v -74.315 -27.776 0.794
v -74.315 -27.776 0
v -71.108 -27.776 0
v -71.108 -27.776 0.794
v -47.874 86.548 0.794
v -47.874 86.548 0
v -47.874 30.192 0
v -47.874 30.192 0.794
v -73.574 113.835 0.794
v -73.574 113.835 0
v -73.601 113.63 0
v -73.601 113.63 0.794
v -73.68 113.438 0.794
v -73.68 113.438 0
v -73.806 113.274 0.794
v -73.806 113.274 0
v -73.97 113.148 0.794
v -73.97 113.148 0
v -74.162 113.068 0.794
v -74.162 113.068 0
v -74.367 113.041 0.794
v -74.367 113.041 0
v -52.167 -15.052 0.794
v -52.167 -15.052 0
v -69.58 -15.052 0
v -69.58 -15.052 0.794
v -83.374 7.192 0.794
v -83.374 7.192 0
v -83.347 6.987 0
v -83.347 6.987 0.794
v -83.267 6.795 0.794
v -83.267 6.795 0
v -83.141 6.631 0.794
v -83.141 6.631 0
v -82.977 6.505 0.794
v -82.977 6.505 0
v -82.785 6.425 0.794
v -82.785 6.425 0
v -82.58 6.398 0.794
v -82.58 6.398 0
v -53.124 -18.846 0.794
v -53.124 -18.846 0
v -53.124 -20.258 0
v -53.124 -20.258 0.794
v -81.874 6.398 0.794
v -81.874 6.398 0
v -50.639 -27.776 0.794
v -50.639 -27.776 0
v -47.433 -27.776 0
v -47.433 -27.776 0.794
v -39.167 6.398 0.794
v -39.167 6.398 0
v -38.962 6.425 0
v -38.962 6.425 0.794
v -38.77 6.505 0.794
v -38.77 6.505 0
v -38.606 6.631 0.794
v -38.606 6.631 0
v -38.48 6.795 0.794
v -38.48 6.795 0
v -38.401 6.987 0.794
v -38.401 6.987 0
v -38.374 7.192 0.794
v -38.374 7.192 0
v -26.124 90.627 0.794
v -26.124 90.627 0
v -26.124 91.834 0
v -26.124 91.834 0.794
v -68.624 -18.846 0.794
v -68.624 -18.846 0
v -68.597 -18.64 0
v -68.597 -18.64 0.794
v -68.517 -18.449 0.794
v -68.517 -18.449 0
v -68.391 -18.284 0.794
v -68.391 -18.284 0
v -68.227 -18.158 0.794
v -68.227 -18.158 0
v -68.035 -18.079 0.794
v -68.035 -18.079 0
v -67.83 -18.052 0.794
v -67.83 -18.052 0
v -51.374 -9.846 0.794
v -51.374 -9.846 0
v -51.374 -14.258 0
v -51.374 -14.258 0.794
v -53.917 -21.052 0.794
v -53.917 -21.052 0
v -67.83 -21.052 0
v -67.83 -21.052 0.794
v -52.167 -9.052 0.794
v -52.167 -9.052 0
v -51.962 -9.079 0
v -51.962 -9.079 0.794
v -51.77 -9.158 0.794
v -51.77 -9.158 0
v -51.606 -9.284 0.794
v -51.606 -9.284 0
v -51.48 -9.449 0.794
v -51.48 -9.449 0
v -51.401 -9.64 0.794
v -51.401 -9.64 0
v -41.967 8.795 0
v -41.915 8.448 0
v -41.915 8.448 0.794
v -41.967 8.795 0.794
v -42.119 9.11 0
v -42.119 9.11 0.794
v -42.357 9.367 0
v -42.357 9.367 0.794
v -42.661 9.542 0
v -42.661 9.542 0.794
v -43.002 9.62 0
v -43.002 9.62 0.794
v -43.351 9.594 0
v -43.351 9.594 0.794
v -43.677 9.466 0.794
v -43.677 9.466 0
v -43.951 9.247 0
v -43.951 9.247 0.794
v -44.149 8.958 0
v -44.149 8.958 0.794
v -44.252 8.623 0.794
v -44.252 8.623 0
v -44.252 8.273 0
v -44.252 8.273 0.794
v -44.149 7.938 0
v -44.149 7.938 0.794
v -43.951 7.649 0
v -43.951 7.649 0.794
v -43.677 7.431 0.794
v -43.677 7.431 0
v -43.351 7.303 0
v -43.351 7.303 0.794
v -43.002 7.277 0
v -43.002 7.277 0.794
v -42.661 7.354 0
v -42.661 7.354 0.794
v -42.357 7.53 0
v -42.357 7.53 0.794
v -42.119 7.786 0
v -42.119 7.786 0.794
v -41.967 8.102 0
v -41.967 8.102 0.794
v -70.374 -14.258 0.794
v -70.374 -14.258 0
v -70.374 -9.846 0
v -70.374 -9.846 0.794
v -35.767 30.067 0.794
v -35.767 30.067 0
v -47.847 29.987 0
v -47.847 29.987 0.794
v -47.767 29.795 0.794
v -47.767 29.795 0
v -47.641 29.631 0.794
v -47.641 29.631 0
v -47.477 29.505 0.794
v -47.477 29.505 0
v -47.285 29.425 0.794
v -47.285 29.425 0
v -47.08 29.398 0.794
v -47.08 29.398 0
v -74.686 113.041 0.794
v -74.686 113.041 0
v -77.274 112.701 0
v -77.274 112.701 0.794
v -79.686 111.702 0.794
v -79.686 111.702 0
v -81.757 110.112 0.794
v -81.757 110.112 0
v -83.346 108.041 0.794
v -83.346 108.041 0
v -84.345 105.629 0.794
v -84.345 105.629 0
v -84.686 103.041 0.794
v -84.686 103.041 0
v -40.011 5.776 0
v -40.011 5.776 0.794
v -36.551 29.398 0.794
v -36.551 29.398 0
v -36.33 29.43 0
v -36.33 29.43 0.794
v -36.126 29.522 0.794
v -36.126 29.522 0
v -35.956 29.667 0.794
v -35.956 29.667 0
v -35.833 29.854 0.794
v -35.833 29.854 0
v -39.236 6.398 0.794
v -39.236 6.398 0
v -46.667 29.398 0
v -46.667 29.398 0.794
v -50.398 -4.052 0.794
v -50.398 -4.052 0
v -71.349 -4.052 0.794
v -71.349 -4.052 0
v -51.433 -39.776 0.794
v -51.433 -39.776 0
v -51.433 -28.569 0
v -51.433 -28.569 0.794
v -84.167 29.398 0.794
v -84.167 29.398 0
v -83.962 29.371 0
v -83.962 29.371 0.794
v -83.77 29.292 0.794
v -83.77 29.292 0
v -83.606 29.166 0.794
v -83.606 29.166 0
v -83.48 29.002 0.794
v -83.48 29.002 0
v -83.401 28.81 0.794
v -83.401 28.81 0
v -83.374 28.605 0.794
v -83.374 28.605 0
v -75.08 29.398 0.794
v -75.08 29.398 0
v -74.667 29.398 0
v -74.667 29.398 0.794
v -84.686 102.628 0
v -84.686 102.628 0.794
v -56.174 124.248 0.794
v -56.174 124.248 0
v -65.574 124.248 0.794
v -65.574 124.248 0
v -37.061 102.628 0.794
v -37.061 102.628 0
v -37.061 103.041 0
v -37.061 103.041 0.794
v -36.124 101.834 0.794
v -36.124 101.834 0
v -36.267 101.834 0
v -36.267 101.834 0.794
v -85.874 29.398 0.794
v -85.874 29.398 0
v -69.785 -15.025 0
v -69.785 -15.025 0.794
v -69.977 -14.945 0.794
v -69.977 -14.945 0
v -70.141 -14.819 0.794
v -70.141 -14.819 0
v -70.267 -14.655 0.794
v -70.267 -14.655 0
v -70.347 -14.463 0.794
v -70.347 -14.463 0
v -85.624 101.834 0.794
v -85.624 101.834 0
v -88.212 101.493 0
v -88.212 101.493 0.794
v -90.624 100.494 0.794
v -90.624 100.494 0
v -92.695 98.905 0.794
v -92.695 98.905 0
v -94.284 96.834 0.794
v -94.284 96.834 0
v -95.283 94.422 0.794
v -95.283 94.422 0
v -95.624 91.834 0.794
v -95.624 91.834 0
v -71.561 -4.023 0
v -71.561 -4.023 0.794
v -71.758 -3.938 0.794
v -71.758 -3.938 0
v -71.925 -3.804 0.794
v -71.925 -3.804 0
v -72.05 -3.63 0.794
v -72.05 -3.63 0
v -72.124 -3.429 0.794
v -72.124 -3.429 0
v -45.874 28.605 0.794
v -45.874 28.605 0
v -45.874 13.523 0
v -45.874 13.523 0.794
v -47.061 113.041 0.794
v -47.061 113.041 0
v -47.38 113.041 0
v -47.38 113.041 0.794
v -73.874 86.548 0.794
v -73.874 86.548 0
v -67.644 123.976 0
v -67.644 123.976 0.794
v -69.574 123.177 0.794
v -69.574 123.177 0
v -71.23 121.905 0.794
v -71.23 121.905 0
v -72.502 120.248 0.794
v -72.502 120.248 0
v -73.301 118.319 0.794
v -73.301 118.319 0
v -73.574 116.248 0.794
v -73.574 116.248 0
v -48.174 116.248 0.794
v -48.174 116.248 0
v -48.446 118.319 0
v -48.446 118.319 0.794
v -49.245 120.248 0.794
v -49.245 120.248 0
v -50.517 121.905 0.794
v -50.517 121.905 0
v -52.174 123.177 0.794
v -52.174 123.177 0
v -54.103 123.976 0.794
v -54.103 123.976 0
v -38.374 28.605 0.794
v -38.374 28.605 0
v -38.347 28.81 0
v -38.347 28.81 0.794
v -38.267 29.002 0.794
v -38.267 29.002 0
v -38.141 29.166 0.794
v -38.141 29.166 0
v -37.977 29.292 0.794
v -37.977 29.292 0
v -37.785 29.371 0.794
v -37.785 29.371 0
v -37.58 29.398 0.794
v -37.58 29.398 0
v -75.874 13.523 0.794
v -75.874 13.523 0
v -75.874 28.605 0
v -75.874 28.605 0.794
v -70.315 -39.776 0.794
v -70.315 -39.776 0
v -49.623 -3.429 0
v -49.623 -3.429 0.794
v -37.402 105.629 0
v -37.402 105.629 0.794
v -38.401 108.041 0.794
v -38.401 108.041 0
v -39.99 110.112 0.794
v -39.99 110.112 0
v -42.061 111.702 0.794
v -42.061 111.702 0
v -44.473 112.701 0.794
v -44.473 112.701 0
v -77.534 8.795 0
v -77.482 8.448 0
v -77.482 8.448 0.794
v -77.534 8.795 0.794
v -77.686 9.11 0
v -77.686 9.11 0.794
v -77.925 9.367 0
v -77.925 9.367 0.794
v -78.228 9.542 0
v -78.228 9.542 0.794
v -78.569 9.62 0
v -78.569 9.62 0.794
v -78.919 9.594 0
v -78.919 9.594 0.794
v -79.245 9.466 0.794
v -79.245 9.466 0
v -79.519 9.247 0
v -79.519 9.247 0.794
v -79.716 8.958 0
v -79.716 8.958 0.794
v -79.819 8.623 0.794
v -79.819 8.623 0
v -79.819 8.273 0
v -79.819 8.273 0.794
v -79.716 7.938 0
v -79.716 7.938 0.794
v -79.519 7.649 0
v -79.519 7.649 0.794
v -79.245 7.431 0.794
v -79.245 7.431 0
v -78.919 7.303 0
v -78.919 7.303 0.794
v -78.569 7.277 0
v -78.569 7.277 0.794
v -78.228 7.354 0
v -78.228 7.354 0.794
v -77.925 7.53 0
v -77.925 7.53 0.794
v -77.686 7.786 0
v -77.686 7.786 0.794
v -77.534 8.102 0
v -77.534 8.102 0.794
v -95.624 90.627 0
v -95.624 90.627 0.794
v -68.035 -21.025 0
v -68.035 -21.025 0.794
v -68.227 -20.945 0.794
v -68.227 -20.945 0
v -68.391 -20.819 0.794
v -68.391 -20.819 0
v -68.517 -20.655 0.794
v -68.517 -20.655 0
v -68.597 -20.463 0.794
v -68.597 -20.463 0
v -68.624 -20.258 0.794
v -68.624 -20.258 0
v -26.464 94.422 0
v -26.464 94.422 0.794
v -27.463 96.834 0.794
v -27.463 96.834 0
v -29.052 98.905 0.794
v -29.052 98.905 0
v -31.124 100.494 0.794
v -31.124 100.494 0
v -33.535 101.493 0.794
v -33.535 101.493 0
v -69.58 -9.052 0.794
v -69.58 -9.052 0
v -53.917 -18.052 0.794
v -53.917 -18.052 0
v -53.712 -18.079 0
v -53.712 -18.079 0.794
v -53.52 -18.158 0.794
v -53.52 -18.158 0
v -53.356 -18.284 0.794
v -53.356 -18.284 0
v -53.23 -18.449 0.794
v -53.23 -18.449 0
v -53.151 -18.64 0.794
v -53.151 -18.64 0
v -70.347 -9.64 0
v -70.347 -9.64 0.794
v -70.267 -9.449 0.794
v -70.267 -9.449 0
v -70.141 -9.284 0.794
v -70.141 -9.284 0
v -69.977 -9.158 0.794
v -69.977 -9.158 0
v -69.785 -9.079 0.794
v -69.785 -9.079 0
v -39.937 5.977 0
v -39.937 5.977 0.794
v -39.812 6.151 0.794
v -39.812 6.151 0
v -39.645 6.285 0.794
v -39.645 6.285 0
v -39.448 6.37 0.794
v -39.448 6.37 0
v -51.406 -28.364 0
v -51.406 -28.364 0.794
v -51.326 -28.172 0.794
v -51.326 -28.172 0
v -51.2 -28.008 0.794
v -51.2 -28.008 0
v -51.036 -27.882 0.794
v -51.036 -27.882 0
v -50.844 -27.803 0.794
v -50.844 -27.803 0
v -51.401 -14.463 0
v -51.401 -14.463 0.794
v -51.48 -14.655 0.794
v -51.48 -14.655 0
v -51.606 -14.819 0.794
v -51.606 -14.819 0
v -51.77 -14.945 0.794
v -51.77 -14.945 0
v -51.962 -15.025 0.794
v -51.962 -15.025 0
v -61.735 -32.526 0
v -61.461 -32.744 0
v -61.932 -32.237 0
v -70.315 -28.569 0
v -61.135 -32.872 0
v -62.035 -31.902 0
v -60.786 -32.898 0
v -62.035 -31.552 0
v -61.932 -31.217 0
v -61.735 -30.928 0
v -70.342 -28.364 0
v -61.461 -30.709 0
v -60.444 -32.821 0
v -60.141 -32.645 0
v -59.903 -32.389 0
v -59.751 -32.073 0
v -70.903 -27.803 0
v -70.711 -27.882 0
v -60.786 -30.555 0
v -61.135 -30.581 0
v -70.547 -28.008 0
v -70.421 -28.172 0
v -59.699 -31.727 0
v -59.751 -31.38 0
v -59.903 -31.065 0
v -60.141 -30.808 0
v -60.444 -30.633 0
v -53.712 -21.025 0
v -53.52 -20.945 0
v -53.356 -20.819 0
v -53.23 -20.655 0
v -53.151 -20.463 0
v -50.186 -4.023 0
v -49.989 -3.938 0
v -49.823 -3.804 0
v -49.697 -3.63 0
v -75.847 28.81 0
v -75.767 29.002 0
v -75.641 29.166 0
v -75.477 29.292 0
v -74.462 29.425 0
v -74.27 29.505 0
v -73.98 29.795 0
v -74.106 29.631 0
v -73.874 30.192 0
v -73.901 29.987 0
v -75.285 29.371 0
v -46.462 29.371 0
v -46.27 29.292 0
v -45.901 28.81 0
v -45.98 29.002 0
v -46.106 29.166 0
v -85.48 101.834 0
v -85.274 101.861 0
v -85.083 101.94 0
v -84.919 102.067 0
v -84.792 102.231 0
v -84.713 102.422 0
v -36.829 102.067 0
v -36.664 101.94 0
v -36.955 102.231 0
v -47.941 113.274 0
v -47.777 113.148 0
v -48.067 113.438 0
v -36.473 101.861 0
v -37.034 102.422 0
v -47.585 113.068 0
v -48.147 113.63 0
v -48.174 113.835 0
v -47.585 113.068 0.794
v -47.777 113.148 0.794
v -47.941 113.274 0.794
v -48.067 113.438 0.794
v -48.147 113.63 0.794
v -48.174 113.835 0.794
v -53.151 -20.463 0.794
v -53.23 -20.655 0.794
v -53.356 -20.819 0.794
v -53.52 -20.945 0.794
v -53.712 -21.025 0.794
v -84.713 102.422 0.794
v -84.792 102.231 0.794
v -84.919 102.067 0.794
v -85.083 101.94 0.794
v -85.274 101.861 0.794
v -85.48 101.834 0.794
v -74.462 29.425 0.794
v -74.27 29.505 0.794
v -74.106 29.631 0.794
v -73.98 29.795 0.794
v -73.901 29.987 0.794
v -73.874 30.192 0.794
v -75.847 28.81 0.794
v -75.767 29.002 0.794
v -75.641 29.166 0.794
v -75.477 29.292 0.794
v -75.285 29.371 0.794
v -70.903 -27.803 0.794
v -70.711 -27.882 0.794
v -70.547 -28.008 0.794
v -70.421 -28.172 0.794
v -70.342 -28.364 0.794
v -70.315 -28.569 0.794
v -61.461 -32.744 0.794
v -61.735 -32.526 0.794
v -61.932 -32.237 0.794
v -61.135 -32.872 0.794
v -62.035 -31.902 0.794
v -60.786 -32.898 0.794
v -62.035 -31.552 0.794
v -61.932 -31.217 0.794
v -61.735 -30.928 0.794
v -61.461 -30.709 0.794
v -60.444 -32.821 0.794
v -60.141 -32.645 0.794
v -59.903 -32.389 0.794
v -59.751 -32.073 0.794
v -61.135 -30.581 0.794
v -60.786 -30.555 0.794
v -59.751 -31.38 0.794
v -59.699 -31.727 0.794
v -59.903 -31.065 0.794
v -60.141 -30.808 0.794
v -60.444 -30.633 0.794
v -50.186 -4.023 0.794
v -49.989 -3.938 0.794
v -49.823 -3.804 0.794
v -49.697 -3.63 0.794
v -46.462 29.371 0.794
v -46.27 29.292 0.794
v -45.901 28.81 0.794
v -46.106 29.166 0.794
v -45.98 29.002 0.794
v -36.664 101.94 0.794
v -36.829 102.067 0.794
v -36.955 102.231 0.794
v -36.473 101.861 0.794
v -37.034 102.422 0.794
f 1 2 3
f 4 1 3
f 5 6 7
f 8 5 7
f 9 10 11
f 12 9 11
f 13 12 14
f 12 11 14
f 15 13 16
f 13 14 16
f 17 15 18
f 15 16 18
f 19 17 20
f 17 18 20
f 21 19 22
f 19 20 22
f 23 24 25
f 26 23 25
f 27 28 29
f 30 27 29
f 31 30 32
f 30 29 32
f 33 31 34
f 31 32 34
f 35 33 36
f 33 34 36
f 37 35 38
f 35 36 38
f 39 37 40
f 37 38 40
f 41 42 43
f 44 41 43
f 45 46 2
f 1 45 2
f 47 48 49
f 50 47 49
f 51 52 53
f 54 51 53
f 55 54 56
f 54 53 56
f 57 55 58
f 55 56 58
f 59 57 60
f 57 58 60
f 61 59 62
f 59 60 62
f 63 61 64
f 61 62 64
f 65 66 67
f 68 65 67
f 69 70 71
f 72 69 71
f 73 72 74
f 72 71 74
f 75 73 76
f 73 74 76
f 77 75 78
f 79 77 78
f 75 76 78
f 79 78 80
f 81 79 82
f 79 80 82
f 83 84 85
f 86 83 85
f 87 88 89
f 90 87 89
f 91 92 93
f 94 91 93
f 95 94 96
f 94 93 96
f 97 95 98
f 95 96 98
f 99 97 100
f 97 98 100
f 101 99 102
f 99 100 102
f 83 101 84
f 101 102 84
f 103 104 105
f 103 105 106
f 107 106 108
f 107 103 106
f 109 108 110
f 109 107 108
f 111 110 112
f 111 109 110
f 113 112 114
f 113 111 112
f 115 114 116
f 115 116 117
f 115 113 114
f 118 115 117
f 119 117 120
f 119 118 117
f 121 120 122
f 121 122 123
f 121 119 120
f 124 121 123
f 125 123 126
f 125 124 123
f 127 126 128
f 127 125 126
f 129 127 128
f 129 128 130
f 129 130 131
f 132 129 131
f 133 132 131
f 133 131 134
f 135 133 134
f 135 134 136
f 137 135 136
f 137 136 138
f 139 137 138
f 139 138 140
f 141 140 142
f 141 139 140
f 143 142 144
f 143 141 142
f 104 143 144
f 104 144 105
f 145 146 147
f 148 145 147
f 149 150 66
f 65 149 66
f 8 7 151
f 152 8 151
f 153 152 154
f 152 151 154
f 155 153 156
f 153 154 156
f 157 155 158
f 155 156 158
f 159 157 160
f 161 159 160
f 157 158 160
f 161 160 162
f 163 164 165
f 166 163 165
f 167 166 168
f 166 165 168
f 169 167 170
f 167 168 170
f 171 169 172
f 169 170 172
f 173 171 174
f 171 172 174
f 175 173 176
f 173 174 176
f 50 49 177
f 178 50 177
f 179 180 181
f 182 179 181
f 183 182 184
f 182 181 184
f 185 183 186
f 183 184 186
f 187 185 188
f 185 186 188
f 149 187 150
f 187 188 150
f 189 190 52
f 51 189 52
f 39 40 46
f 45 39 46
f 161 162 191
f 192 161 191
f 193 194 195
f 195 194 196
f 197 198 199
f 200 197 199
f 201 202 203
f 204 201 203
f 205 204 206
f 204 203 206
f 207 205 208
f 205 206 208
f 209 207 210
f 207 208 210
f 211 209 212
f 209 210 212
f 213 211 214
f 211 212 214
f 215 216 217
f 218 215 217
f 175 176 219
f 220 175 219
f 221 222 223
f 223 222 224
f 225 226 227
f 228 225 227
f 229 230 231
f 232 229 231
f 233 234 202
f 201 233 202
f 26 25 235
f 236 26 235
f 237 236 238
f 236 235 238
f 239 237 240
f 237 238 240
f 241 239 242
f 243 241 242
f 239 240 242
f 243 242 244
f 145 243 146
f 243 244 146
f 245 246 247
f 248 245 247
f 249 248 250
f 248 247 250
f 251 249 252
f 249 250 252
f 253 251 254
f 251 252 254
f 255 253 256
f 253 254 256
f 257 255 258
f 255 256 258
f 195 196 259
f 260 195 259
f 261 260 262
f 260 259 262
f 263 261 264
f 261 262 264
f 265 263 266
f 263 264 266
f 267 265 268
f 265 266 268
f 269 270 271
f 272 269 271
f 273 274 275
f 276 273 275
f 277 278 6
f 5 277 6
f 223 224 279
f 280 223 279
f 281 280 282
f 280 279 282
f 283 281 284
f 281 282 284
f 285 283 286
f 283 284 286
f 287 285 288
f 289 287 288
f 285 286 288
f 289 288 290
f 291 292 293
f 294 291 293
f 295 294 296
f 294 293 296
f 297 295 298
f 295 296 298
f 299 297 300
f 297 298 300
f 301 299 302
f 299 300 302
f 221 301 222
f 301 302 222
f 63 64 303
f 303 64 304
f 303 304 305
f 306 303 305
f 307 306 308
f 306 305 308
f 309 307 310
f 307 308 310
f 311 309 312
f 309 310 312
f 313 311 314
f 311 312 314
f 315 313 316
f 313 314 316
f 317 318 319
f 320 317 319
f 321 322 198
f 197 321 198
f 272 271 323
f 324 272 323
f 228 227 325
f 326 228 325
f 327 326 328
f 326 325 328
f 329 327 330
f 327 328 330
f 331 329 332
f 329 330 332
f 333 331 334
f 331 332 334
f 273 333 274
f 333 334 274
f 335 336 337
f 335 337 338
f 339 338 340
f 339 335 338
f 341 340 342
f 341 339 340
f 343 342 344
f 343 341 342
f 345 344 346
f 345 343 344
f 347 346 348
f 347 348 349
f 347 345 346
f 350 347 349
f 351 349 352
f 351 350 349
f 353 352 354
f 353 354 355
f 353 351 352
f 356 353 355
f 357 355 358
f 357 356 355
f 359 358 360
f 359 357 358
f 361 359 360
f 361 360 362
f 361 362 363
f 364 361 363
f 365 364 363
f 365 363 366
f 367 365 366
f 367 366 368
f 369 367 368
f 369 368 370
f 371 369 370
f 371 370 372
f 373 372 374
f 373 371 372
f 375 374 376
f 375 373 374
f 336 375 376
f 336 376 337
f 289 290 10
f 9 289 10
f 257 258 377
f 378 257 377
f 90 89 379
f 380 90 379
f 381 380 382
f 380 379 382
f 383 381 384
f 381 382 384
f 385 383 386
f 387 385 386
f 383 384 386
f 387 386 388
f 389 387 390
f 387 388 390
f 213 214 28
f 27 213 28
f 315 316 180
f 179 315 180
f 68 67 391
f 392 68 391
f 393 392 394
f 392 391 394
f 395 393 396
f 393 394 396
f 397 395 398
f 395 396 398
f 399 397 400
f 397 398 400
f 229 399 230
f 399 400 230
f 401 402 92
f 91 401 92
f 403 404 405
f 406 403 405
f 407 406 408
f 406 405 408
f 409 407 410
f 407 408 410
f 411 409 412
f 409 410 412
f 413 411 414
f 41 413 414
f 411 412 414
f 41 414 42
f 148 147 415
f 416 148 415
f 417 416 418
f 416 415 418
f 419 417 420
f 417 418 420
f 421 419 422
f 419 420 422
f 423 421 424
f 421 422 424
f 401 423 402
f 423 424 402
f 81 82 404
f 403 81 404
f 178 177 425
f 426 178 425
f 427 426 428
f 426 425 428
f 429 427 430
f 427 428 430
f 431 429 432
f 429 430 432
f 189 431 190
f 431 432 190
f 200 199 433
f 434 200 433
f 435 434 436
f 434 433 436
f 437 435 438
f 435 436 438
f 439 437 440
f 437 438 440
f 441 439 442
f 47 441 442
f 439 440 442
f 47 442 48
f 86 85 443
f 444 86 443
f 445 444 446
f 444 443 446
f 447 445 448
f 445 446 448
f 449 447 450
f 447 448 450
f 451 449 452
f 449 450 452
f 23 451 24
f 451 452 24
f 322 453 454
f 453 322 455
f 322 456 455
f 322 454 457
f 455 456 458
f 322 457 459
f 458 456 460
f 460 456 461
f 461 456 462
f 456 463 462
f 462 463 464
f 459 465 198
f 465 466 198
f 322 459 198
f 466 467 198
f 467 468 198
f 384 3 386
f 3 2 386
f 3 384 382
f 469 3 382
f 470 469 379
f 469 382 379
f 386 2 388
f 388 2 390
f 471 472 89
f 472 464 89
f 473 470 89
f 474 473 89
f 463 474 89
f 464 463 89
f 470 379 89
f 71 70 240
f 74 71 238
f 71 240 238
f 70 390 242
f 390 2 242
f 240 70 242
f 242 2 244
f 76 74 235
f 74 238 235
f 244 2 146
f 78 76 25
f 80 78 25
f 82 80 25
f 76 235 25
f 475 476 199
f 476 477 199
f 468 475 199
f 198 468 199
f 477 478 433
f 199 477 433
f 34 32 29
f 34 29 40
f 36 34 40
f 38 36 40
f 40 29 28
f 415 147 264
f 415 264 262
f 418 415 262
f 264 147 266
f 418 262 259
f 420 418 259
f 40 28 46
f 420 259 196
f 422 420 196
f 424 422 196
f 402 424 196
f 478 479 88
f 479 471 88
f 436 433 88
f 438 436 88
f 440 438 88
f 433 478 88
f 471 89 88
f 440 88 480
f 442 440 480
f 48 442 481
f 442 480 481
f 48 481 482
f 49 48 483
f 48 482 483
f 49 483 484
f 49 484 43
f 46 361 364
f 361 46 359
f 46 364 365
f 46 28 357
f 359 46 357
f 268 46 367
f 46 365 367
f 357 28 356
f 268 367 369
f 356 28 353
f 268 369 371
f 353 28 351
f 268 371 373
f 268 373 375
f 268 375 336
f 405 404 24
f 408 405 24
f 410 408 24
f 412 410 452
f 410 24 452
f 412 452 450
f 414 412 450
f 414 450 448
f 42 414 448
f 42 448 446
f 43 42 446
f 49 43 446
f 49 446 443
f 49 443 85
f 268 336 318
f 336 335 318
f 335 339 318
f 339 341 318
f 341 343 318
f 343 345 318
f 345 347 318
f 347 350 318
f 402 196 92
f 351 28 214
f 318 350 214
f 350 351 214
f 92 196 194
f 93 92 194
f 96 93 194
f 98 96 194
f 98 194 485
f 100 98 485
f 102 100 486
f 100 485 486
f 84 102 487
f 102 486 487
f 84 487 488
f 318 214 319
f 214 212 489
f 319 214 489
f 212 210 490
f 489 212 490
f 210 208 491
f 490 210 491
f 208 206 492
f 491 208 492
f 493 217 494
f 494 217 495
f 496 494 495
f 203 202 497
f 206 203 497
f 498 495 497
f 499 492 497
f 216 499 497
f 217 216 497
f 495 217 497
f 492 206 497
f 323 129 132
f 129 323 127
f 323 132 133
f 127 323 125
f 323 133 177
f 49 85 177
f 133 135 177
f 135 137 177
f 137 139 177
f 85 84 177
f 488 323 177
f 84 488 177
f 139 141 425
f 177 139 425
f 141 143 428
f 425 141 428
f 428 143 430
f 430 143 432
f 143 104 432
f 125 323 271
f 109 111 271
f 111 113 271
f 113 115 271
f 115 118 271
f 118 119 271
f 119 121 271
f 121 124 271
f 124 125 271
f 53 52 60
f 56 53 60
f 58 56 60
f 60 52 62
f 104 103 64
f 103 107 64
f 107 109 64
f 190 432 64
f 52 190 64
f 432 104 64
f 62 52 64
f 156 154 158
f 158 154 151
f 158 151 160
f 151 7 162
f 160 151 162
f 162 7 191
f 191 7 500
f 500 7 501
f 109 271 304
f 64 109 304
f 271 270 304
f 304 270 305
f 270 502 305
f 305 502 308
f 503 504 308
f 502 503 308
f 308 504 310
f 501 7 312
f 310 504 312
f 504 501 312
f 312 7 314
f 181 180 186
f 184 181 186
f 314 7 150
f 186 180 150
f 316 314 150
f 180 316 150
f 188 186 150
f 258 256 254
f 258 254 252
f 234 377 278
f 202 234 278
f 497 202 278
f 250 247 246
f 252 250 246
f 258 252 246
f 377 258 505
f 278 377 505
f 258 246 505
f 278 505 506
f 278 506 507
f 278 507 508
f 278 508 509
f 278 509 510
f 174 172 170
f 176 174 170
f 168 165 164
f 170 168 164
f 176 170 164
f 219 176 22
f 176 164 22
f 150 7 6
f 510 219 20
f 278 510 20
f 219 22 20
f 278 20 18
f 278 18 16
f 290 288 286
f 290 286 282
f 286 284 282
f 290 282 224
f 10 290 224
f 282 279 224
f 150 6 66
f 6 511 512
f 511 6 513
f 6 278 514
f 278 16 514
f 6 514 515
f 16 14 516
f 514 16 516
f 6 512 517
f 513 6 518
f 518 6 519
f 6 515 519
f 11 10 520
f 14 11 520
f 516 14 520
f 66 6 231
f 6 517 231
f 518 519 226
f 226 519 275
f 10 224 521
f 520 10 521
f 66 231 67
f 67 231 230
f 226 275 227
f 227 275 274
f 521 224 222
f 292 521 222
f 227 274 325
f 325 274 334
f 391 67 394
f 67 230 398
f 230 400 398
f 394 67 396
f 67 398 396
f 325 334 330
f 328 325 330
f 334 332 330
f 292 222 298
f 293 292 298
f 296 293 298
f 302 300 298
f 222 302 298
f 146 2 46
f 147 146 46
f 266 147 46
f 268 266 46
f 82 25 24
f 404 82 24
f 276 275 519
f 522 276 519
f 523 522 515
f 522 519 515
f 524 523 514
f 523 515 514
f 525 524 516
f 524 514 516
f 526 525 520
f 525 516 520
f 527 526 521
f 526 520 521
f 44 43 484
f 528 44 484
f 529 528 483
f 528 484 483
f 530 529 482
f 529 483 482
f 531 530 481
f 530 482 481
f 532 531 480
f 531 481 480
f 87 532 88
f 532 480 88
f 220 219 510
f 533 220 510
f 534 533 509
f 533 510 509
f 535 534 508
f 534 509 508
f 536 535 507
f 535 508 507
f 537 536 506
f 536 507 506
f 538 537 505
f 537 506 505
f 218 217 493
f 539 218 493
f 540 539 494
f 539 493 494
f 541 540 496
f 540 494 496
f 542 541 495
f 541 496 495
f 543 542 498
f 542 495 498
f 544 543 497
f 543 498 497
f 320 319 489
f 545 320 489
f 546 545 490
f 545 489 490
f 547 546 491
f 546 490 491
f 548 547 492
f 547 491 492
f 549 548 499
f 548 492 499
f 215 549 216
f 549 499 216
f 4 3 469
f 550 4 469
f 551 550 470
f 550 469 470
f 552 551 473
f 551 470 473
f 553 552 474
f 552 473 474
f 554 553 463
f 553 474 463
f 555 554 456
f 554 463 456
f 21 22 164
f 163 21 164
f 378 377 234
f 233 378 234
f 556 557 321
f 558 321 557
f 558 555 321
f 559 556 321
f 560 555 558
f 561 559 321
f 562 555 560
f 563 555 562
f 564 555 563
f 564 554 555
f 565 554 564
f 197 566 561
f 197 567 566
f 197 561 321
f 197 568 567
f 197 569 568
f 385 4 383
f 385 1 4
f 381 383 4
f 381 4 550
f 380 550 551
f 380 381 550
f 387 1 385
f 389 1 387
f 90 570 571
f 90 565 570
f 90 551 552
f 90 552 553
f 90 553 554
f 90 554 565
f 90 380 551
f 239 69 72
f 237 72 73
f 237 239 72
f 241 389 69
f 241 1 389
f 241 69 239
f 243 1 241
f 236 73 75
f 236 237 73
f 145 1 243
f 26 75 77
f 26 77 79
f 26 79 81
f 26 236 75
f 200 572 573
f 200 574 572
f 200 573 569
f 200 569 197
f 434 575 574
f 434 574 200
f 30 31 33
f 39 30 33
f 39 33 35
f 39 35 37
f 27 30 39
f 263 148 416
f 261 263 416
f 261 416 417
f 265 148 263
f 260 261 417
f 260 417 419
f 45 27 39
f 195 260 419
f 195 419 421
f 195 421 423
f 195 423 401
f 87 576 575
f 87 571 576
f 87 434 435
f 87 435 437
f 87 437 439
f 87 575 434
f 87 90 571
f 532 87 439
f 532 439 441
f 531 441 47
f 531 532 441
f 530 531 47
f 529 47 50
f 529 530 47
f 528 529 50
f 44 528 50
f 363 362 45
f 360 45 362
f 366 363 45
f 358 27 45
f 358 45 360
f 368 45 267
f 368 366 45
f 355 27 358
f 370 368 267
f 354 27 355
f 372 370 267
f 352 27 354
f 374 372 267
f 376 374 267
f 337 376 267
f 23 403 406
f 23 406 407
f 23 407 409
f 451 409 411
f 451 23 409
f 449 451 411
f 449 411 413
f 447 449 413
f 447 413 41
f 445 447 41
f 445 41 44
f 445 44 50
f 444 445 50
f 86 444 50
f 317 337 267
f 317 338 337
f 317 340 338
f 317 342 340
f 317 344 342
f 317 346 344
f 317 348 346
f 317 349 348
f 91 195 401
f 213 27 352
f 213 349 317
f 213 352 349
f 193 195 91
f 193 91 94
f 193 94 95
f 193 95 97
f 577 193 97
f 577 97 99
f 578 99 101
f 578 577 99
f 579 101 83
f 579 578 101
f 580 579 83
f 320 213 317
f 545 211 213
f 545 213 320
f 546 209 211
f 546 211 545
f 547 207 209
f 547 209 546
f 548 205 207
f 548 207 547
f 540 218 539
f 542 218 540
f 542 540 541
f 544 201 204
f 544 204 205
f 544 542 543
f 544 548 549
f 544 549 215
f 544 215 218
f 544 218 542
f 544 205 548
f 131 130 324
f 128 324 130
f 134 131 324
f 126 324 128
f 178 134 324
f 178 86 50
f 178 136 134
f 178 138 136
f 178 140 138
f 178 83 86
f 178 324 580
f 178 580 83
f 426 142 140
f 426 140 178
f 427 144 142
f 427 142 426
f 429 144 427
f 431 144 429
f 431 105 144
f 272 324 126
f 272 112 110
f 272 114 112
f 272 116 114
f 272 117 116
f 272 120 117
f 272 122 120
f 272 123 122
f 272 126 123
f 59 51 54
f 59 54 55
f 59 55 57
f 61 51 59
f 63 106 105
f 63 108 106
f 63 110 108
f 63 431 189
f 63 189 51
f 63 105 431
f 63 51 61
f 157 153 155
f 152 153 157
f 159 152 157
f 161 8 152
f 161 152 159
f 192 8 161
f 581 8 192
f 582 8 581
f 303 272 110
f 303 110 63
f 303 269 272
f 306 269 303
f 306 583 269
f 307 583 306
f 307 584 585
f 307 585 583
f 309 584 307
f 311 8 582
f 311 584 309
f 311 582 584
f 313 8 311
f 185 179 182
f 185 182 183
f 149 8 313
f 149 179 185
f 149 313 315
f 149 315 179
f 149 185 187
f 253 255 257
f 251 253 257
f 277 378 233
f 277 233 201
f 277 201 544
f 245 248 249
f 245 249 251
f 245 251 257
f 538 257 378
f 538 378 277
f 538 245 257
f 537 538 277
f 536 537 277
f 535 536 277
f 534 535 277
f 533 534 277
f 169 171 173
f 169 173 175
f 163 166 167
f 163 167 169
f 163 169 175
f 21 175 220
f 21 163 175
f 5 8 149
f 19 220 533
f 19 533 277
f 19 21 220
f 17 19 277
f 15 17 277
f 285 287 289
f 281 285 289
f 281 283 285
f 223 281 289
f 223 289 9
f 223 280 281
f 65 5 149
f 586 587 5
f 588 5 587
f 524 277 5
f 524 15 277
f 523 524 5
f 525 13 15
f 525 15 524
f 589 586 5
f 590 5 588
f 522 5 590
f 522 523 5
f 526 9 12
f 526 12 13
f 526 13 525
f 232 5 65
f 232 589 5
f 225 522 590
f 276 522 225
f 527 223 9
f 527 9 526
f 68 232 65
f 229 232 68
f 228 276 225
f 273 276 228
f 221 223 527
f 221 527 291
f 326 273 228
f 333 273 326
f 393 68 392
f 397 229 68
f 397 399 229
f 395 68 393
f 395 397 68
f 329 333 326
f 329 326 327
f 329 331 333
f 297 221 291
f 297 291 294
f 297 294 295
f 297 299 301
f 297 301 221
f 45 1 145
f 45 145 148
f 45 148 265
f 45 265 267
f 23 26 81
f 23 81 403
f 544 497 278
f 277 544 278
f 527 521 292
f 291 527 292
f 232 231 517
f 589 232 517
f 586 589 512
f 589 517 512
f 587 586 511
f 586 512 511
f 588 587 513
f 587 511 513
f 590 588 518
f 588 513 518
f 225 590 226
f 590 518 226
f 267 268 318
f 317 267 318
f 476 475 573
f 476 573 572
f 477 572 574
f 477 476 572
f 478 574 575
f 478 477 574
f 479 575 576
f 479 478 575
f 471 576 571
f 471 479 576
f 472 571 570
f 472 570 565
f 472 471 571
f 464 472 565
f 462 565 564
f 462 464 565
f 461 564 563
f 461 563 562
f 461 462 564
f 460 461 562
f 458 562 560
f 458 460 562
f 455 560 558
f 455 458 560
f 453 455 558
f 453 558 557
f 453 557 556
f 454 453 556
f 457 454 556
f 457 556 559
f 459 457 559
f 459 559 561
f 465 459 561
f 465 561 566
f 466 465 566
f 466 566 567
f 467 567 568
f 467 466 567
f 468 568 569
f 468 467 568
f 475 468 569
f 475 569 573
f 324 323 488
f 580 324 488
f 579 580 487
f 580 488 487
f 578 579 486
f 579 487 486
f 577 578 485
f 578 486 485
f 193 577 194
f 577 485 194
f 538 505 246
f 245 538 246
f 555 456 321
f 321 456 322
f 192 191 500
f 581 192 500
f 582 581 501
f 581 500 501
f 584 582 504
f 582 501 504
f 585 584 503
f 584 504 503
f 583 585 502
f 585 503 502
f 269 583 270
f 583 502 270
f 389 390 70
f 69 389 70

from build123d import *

# Parameters (mm, degrees)
F0_R     = 1.175
F1_DEPTH = 0.79375


with BuildPart() as f1:
    # F0 (on Top) → F1 (new body)
    with BuildSketch(Plane.XY):
        with BuildLine():
            Line((-95.623562, 91.834139), (-95.623562, 90.626995))
            Line((-95.623562, 90.626995), (-85.873562, 29.398428))
            Line((-85.873562, 29.398428), (-84.167312, 29.398428))
            ThreePointArc((-84.167312, 29.398428), (-83.606046, 29.165944), (-83.373562, 28.604678))
            Line((-83.373562, 28.604678), (-83.373562, 7.192178))
            ThreePointArc((-83.373562, 7.192178), (-83.141078, 6.630911), (-82.579812, 6.398428))
            Line((-82.579812, 6.398428), (-81.873562, 6.398428))
            Line((-81.873562, 6.398428), (-74.314535, -27.775555))
            Line((-74.314535, -27.775555), (-71.108285, -27.775555))
            ThreePointArc((-71.108285, -27.775555), (-70.547019, -28.008039), (-70.314535, -28.569305))
            Line((-70.314535, -28.569305), (-70.314535, -39.775555))
            Line((-70.314535, -39.775555), (-51.43259, -39.775555))
            Line((-51.43259, -39.775555), (-51.43259, -28.569305))
            ThreePointArc((-51.43259, -28.569305), (-51.200106, -28.008039), (-50.63884, -27.775555))
            Line((-50.63884, -27.775555), (-47.43259, -27.775555))
            Line((-47.43259, -27.775555), (-40.011215, 5.776105))
            ThreePointArc((-40.011215, 5.776105), (-39.733173, 6.223592), (-39.236198, 6.398428))
            Line((-39.236198, 6.398428), (-39.167312, 6.398428))
            ThreePointArc((-39.167312, 6.398428), (-38.606046, 6.630911), (-38.373562, 7.192178))
            Line((-38.373562, 7.192178), (-38.373562, 28.604678))
            ThreePointArc((-38.373562, 28.604678), (-38.141078, 29.165944), (-37.579812, 29.398428))
            Line((-37.579812, 29.398428), (-36.550917, 29.398428))
            ThreePointArc((-36.550917, 29.398428), (-36.035669, 29.58839), (-35.767043, 30.067354))
            Line((-35.767043, 30.067354), (-26.123562, 90.626995))
            Line((-26.123562, 90.626995), (-26.123562, 91.834139))
            ThreePointArc((-26.123562, 91.834139), (-29.052495, 98.905207), (-36.123562, 101.834139))
            Line((-36.123562, 101.834139), (-36.267312, 101.834139))
            ThreePointArc((-36.267312, 101.834139), (-36.828578, 102.066623), (-37.061062, 102.627889))
            Line((-37.061062, 102.627889), (-37.061062, 103.041283))
            ThreePointArc((-37.061062, 103.041283), (-39.989995, 110.112351), (-47.061062, 113.041283))
            Line((-47.061062, 113.041283), (-47.379812, 113.041283))
            ThreePointArc((-47.379812, 113.041283), (-47.941078, 113.273767), (-48.173562, 113.835033))
            Line((-48.173562, 113.835033), (-48.173562, 116.248428))
            ThreePointArc((-48.173562, 116.248428), (-50.516708, 121.905282), (-56.173562, 124.248428))
            Line((-56.173562, 124.248428), (-65.573562, 124.248428))
            ThreePointArc((-65.573562, 124.248428), (-71.230417, 121.905282), (-73.573562, 116.248428))
            Line((-73.573562, 116.248428), (-73.573562, 113.835033))
            ThreePointArc((-73.573562, 113.835033), (-73.806046, 113.273767), (-74.367312, 113.041283))
            Line((-74.367312, 113.041283), (-74.686062, 113.041283))
            ThreePointArc((-74.686062, 113.041283), (-81.75713, 110.112351), (-84.686062, 103.041283))
            Line((-84.686062, 103.041283), (-84.686062, 102.627889))
            ThreePointArc((-84.686062, 102.627889), (-84.918546, 102.066623), (-85.479812, 101.834139))
            Line((-85.479812, 101.834139), (-85.623562, 101.834139))
            ThreePointArc((-85.623562, 101.834139), (-92.69463, 98.905207), (-95.623562, 91.834139))
        make_face()
        with Locations((-78.657184, 8.448236)):
            Circle(F0_R, mode=Mode.SUBTRACT)
        with Locations((-60.873562, -31.726764)):
            Circle(F0_R, mode=Mode.SUBTRACT)
        with BuildLine():
            Line((-67.829812, -18.051764), (-53.917312, -18.051764))
            ThreePointArc((-53.917312, -18.051764), (-53.356046, -18.284248), (-53.123562, -18.845514))
            Line((-53.123562, -18.845514), (-53.123562, -20.258014))
            ThreePointArc((-53.123562, -20.258014), (-53.356046, -20.81928), (-53.917312, -21.051764))
            Line((-53.917312, -21.051764), (-67.829812, -21.051764))
            ThreePointArc((-67.829812, -21.051764), (-68.391078, -20.81928), (-68.623562, -20.258014))
            Line((-68.623562, -20.258014), (-68.623562, -18.845514))
            ThreePointArc((-68.623562, -18.845514), (-68.391078, -18.284248), (-67.829812, -18.051764))
        make_face(mode=Mode.SUBTRACT)
        with BuildLine():
            Line((-69.579812, -9.051764), (-52.167312, -9.051764))
            ThreePointArc((-52.167312, -9.051764), (-51.606046, -9.284248), (-51.373562, -9.845514))
            Line((-51.373562, -9.845514), (-51.373562, -14.258014))
            ThreePointArc((-51.373562, -14.258014), (-51.606046, -14.81928), (-52.167312, -15.051764))
            Line((-52.167312, -15.051764), (-69.579812, -15.051764))
            ThreePointArc((-69.579812, -15.051764), (-70.141078, -14.81928), (-70.373562, -14.258014))
            Line((-70.373562, -14.258014), (-70.373562, -9.845514))
            ThreePointArc((-70.373562, -9.845514), (-70.141078, -9.284248), (-69.579812, -9.051764))
        make_face(mode=Mode.SUBTRACT)
        with BuildLine():
            Line((-73.873562, 30.192178), (-73.873562, 86.548428))
            Line((-73.873562, 86.548428), (-47.873562, 86.548428))
            Line((-47.873562, 86.548428), (-47.873562, 30.192178))
            ThreePointArc((-47.873562, 30.192178), (-47.641078, 29.630911), (-47.079812, 29.398428))
            Line((-47.079812, 29.398428), (-46.667312, 29.398428))
            ThreePointArc((-46.667312, 29.398428), (-46.106046, 29.165944), (-45.873562, 28.604678))
            Line((-45.873562, 28.604678), (-45.873562, 13.523428))
            Line((-45.873562, 13.523428), (-49.623409, -3.429442))
            ThreePointArc((-49.623409, -3.429442), (-49.901452, -3.876928), (-50.398426, -4.051764))
            Line((-50.398426, -4.051764), (-71.348698, -4.051764))
            ThreePointArc((-71.348698, -4.051764), (-71.845673, -3.876928), (-72.123715, -3.429442))
            Line((-72.123715, -3.429442), (-75.873562, 13.523428))
            Line((-75.873562, 13.523428), (-75.873562, 28.604678))
            ThreePointArc((-75.873562, 28.604678), (-75.641078, 29.165944), (-75.079812, 29.398428))
            Line((-75.079812, 29.398428), (-74.667312, 29.398428))
            ThreePointArc((-74.667312, 29.398428), (-74.106046, 29.630911), (-73.873562, 30.192178))
        make_face(mode=Mode.SUBTRACT)
        with Locations((-43.08994, 8.448236)):
            Circle(F0_R, mode=Mode.SUBTRACT)
    extrude(amount=F1_DEPTH)


solid = f1.part
